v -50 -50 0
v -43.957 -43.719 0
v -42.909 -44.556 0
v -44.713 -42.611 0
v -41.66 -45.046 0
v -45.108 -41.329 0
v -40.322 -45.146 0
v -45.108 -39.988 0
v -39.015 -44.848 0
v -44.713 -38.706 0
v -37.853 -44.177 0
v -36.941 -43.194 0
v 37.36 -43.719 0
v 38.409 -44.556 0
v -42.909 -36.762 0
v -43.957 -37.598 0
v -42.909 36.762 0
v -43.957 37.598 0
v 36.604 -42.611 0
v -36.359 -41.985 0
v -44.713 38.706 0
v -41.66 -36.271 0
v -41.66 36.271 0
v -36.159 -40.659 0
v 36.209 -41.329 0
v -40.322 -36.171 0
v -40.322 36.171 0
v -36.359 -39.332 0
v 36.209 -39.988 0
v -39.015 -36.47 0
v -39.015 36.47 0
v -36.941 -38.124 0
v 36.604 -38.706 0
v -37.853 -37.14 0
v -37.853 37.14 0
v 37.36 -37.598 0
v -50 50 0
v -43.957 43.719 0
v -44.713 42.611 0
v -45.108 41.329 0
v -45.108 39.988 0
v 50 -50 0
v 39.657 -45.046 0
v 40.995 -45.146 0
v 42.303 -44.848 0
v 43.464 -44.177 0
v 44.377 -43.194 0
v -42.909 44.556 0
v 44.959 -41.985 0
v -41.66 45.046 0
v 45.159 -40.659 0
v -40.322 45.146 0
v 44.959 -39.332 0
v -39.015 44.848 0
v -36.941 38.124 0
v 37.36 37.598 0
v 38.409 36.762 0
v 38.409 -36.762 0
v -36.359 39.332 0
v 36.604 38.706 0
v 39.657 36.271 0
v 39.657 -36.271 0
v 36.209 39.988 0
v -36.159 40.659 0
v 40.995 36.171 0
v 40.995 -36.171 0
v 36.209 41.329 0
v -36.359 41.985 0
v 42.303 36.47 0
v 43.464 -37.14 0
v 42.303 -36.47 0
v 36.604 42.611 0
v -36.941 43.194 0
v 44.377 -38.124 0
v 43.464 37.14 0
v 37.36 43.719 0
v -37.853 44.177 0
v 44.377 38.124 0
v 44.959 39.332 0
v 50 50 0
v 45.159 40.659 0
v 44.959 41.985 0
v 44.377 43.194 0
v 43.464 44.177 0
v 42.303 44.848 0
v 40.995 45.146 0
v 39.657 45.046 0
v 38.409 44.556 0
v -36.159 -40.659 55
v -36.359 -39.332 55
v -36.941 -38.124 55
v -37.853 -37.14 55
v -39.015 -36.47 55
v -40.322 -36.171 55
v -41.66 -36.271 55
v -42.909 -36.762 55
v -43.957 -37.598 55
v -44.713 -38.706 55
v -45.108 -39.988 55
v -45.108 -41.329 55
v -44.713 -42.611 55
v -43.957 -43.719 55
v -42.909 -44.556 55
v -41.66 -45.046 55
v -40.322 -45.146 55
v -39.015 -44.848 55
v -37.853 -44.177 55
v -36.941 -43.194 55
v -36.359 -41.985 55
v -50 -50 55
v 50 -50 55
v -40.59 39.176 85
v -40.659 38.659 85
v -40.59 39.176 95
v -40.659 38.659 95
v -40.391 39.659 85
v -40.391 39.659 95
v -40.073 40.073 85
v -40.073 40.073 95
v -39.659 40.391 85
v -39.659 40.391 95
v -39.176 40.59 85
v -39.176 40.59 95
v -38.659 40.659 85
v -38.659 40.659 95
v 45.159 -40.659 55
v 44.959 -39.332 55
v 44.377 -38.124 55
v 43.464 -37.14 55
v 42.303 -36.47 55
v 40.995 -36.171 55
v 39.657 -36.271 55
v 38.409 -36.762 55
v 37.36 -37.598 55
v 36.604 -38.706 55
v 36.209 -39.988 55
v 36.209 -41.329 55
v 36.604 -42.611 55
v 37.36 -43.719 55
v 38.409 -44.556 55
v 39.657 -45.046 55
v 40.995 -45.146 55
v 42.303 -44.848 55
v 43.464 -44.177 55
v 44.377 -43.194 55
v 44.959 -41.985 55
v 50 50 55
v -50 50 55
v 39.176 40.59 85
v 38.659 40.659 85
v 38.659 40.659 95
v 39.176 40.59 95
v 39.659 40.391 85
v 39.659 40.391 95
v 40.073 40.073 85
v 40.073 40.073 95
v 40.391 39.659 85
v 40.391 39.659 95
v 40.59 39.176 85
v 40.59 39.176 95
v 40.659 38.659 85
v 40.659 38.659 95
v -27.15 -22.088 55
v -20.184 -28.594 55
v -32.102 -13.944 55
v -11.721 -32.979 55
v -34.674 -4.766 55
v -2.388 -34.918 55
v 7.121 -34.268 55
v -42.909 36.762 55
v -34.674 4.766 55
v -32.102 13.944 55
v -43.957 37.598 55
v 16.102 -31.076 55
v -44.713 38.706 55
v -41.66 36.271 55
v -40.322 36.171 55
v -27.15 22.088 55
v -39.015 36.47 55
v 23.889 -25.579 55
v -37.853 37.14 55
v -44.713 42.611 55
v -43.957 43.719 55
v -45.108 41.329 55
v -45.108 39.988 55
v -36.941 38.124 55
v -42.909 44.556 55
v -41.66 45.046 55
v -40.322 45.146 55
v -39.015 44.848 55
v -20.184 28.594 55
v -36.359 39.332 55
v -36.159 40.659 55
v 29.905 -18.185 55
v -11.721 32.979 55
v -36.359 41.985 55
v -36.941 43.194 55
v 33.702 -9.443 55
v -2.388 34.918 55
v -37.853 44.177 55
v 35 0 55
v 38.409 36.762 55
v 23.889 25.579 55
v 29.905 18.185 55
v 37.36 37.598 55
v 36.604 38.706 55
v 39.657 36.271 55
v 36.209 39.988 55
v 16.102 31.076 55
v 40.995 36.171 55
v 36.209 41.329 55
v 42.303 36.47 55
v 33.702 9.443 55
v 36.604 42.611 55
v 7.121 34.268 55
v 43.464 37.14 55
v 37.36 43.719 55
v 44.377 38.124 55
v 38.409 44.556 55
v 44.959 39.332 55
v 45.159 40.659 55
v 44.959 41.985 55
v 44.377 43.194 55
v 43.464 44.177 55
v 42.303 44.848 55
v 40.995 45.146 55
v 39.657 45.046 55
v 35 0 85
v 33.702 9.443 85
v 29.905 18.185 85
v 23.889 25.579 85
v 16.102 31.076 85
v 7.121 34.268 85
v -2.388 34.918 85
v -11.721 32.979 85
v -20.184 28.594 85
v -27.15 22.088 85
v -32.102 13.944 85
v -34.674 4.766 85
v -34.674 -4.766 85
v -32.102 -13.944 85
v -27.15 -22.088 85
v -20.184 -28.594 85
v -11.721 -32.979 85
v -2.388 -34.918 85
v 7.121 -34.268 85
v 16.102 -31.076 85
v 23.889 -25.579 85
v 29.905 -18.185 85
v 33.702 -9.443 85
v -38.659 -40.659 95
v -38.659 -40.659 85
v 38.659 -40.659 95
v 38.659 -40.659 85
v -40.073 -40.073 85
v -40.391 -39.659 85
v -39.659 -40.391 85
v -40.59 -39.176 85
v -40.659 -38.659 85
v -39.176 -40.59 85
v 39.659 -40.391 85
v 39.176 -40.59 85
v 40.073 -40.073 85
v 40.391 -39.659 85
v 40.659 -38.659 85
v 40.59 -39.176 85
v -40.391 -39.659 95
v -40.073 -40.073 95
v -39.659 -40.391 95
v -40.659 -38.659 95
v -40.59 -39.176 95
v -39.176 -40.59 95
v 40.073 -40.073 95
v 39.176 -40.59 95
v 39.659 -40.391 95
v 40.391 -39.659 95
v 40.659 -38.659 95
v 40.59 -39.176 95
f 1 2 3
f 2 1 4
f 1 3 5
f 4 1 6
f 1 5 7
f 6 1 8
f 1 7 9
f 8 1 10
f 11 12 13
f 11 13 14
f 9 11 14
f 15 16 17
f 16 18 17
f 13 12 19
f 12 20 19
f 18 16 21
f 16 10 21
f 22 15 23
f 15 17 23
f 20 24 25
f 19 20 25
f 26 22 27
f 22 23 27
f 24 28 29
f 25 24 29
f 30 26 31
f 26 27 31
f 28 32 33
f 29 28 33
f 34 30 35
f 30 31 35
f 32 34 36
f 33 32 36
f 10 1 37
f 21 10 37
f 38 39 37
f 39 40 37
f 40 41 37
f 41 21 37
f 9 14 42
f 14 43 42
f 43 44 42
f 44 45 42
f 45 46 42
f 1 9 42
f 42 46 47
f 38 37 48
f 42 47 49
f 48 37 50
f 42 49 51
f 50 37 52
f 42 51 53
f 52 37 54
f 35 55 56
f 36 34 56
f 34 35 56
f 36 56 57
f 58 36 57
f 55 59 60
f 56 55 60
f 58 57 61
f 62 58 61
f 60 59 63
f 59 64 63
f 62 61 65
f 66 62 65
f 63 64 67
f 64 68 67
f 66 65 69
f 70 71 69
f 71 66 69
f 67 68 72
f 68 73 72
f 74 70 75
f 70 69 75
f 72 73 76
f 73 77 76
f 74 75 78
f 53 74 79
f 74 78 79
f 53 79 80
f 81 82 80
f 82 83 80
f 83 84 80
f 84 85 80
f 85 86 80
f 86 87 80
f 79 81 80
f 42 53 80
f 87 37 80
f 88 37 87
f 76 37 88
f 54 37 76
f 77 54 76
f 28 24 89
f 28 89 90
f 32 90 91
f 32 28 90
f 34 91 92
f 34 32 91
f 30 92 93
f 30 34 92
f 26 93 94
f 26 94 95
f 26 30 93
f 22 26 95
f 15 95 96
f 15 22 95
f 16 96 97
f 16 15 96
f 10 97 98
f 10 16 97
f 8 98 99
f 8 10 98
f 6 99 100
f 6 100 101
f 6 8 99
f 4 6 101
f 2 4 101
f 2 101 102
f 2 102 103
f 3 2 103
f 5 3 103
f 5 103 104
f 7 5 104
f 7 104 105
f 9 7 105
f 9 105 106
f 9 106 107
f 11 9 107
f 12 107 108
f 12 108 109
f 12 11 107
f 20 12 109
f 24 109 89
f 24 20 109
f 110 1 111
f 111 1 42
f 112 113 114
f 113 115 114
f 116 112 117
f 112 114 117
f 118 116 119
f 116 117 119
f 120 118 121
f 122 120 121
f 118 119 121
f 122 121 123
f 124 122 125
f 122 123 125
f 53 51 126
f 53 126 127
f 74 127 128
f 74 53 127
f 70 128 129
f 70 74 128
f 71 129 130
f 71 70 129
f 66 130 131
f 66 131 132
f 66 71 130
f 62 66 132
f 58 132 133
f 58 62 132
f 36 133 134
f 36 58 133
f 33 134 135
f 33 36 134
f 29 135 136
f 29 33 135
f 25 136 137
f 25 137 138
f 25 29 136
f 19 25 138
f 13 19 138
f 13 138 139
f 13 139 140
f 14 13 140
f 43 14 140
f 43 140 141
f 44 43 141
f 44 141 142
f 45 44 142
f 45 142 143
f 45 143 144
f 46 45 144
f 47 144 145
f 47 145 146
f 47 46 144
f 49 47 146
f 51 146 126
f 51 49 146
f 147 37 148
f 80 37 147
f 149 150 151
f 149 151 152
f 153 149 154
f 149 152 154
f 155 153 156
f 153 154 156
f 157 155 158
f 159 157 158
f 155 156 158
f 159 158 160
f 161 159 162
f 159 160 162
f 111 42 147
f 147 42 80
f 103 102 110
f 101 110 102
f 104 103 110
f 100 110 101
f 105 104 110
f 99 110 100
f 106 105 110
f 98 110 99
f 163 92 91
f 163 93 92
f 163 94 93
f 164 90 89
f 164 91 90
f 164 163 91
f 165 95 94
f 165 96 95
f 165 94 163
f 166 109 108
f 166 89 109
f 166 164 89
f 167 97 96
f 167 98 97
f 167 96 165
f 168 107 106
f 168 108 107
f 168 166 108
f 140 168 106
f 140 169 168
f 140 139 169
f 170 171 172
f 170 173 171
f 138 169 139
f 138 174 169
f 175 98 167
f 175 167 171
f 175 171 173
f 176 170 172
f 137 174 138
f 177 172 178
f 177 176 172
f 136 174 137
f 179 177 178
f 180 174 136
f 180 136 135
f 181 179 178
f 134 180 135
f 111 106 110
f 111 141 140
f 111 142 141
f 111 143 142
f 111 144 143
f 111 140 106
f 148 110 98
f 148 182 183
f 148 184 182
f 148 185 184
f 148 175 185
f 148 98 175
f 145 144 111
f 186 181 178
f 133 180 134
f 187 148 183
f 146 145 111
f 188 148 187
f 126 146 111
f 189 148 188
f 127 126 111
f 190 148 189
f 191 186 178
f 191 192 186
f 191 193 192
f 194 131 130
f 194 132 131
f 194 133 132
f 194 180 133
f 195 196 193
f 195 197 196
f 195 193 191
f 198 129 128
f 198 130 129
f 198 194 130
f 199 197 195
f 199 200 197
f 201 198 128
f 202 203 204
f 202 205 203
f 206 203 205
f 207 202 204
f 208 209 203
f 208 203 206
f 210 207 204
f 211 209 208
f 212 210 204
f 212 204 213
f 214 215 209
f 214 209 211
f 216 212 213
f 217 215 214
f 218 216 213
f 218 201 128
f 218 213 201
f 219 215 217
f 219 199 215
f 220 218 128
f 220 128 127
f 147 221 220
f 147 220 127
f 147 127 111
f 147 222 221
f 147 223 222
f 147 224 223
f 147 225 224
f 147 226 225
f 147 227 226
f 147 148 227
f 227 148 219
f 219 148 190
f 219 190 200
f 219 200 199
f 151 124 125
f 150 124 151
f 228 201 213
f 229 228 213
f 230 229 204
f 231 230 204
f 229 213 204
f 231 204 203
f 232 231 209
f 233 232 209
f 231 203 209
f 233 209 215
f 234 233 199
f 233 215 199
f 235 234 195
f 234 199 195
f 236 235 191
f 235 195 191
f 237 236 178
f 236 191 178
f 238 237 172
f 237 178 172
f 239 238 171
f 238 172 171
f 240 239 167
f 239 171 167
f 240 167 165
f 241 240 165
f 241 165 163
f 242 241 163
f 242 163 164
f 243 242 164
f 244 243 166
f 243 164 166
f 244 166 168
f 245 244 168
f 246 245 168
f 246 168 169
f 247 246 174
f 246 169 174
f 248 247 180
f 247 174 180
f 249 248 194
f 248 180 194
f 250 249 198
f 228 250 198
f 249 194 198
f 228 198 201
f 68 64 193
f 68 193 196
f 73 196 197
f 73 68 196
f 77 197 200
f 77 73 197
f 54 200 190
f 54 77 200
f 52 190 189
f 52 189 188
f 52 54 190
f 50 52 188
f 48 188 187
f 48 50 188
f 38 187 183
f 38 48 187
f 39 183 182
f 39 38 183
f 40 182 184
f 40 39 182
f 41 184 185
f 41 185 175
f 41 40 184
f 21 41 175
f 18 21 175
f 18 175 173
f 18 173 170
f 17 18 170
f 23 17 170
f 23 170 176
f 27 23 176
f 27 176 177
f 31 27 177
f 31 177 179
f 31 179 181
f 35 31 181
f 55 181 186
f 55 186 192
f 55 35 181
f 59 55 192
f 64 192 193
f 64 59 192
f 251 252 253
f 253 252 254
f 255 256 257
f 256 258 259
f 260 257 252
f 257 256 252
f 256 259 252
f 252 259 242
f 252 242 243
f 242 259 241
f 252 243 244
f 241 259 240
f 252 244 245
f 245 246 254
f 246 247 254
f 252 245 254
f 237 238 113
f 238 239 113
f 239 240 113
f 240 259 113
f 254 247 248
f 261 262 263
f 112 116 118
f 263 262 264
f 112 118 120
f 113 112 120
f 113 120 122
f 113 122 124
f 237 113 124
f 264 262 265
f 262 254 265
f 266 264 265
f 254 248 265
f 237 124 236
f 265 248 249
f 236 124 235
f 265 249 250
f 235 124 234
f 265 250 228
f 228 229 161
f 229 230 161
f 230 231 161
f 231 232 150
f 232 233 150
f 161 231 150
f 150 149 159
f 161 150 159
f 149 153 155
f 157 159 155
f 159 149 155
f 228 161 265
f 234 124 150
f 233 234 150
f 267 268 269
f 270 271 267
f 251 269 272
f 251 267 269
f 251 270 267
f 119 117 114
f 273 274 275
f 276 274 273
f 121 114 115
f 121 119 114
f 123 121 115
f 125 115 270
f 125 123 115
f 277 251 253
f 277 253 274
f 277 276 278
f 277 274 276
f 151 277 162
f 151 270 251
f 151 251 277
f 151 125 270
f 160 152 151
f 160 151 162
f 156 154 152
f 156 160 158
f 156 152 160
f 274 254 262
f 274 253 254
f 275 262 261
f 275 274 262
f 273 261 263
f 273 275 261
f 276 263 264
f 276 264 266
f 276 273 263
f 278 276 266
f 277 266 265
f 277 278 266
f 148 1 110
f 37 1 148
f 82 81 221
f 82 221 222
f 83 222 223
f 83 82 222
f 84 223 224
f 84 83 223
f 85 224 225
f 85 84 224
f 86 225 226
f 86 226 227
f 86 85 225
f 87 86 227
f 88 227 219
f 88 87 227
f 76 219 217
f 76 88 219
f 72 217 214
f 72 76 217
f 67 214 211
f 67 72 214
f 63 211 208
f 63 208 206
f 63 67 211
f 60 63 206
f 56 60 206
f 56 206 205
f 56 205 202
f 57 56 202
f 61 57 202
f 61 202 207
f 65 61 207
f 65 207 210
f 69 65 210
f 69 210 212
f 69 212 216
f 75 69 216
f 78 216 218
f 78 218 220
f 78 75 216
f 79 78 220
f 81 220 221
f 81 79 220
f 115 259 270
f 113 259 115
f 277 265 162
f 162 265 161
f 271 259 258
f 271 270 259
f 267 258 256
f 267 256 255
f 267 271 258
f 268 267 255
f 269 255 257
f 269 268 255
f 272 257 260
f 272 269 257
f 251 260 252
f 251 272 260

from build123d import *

# Parameters (mm, degrees)
SKETCH_1_W      = 100
SKETCH_1_H      = 100
SKETCH_1_R      = 4.5
EXTRUDE_1_DEPTH = 55
SKETCH_2_R      = 35
EXTRUDE_2_DEPTH = 30
SKETCH_3_W      = 81.317279836
SKETCH_3_H      = 81.317279836
EXTRUDE_3_DEPTH = 10
FILLET_1_R      = 2


with BuildPart() as part:
    # 草图1 → 凸台-拉伸1 (new body)
    with BuildSketch(Plane.XY):
        Rectangle(SKETCH_1_W, SKETCH_1_H)
        with Locations((-40.658639918, 40.658639918)):
            Circle(SKETCH_1_R, mode=Mode.SUBTRACT)
        with Locations((40.658639918, 40.658639918)):
            Circle(SKETCH_1_R, mode=Mode.SUBTRACT)
        with Locations((40.658639918, -40.658639918)):
            Circle(SKETCH_1_R, mode=Mode.SUBTRACT)
        with Locations((-40.658639918, -40.658639918)):
            Circle(SKETCH_1_R, mode=Mode.SUBTRACT)
    extrude(amount=EXTRUDE_1_DEPTH)

    # 草图2 → 凸台-拉伸2 (add)
    with BuildSketch(Plane.XY.offset(55)):
        Circle(SKETCH_2_R)
    extrude(amount=EXTRUDE_2_DEPTH)

    # 草图3 → 凸台-拉伸3 (add)
    with BuildSketch(Plane.XY.offset(85)):
        Rectangle(SKETCH_3_W, SKETCH_3_H)
    extrude(amount=EXTRUDE_3_DEPTH)

    # 圆角1
    fillet_1_edges = [part.edges().sort_by_distance(p)[0] for p in [
        (40.658639918, -40.658639918, 90),
        (40.658639918, 40.658639918, 90),
        (-40.658639918, 40.658639918, 90),
        (-40.658639918, -40.658639918, 90),
    ]]
    fillet(fillet_1_edges, radius=FILLET_1_R)


solid = part.part
